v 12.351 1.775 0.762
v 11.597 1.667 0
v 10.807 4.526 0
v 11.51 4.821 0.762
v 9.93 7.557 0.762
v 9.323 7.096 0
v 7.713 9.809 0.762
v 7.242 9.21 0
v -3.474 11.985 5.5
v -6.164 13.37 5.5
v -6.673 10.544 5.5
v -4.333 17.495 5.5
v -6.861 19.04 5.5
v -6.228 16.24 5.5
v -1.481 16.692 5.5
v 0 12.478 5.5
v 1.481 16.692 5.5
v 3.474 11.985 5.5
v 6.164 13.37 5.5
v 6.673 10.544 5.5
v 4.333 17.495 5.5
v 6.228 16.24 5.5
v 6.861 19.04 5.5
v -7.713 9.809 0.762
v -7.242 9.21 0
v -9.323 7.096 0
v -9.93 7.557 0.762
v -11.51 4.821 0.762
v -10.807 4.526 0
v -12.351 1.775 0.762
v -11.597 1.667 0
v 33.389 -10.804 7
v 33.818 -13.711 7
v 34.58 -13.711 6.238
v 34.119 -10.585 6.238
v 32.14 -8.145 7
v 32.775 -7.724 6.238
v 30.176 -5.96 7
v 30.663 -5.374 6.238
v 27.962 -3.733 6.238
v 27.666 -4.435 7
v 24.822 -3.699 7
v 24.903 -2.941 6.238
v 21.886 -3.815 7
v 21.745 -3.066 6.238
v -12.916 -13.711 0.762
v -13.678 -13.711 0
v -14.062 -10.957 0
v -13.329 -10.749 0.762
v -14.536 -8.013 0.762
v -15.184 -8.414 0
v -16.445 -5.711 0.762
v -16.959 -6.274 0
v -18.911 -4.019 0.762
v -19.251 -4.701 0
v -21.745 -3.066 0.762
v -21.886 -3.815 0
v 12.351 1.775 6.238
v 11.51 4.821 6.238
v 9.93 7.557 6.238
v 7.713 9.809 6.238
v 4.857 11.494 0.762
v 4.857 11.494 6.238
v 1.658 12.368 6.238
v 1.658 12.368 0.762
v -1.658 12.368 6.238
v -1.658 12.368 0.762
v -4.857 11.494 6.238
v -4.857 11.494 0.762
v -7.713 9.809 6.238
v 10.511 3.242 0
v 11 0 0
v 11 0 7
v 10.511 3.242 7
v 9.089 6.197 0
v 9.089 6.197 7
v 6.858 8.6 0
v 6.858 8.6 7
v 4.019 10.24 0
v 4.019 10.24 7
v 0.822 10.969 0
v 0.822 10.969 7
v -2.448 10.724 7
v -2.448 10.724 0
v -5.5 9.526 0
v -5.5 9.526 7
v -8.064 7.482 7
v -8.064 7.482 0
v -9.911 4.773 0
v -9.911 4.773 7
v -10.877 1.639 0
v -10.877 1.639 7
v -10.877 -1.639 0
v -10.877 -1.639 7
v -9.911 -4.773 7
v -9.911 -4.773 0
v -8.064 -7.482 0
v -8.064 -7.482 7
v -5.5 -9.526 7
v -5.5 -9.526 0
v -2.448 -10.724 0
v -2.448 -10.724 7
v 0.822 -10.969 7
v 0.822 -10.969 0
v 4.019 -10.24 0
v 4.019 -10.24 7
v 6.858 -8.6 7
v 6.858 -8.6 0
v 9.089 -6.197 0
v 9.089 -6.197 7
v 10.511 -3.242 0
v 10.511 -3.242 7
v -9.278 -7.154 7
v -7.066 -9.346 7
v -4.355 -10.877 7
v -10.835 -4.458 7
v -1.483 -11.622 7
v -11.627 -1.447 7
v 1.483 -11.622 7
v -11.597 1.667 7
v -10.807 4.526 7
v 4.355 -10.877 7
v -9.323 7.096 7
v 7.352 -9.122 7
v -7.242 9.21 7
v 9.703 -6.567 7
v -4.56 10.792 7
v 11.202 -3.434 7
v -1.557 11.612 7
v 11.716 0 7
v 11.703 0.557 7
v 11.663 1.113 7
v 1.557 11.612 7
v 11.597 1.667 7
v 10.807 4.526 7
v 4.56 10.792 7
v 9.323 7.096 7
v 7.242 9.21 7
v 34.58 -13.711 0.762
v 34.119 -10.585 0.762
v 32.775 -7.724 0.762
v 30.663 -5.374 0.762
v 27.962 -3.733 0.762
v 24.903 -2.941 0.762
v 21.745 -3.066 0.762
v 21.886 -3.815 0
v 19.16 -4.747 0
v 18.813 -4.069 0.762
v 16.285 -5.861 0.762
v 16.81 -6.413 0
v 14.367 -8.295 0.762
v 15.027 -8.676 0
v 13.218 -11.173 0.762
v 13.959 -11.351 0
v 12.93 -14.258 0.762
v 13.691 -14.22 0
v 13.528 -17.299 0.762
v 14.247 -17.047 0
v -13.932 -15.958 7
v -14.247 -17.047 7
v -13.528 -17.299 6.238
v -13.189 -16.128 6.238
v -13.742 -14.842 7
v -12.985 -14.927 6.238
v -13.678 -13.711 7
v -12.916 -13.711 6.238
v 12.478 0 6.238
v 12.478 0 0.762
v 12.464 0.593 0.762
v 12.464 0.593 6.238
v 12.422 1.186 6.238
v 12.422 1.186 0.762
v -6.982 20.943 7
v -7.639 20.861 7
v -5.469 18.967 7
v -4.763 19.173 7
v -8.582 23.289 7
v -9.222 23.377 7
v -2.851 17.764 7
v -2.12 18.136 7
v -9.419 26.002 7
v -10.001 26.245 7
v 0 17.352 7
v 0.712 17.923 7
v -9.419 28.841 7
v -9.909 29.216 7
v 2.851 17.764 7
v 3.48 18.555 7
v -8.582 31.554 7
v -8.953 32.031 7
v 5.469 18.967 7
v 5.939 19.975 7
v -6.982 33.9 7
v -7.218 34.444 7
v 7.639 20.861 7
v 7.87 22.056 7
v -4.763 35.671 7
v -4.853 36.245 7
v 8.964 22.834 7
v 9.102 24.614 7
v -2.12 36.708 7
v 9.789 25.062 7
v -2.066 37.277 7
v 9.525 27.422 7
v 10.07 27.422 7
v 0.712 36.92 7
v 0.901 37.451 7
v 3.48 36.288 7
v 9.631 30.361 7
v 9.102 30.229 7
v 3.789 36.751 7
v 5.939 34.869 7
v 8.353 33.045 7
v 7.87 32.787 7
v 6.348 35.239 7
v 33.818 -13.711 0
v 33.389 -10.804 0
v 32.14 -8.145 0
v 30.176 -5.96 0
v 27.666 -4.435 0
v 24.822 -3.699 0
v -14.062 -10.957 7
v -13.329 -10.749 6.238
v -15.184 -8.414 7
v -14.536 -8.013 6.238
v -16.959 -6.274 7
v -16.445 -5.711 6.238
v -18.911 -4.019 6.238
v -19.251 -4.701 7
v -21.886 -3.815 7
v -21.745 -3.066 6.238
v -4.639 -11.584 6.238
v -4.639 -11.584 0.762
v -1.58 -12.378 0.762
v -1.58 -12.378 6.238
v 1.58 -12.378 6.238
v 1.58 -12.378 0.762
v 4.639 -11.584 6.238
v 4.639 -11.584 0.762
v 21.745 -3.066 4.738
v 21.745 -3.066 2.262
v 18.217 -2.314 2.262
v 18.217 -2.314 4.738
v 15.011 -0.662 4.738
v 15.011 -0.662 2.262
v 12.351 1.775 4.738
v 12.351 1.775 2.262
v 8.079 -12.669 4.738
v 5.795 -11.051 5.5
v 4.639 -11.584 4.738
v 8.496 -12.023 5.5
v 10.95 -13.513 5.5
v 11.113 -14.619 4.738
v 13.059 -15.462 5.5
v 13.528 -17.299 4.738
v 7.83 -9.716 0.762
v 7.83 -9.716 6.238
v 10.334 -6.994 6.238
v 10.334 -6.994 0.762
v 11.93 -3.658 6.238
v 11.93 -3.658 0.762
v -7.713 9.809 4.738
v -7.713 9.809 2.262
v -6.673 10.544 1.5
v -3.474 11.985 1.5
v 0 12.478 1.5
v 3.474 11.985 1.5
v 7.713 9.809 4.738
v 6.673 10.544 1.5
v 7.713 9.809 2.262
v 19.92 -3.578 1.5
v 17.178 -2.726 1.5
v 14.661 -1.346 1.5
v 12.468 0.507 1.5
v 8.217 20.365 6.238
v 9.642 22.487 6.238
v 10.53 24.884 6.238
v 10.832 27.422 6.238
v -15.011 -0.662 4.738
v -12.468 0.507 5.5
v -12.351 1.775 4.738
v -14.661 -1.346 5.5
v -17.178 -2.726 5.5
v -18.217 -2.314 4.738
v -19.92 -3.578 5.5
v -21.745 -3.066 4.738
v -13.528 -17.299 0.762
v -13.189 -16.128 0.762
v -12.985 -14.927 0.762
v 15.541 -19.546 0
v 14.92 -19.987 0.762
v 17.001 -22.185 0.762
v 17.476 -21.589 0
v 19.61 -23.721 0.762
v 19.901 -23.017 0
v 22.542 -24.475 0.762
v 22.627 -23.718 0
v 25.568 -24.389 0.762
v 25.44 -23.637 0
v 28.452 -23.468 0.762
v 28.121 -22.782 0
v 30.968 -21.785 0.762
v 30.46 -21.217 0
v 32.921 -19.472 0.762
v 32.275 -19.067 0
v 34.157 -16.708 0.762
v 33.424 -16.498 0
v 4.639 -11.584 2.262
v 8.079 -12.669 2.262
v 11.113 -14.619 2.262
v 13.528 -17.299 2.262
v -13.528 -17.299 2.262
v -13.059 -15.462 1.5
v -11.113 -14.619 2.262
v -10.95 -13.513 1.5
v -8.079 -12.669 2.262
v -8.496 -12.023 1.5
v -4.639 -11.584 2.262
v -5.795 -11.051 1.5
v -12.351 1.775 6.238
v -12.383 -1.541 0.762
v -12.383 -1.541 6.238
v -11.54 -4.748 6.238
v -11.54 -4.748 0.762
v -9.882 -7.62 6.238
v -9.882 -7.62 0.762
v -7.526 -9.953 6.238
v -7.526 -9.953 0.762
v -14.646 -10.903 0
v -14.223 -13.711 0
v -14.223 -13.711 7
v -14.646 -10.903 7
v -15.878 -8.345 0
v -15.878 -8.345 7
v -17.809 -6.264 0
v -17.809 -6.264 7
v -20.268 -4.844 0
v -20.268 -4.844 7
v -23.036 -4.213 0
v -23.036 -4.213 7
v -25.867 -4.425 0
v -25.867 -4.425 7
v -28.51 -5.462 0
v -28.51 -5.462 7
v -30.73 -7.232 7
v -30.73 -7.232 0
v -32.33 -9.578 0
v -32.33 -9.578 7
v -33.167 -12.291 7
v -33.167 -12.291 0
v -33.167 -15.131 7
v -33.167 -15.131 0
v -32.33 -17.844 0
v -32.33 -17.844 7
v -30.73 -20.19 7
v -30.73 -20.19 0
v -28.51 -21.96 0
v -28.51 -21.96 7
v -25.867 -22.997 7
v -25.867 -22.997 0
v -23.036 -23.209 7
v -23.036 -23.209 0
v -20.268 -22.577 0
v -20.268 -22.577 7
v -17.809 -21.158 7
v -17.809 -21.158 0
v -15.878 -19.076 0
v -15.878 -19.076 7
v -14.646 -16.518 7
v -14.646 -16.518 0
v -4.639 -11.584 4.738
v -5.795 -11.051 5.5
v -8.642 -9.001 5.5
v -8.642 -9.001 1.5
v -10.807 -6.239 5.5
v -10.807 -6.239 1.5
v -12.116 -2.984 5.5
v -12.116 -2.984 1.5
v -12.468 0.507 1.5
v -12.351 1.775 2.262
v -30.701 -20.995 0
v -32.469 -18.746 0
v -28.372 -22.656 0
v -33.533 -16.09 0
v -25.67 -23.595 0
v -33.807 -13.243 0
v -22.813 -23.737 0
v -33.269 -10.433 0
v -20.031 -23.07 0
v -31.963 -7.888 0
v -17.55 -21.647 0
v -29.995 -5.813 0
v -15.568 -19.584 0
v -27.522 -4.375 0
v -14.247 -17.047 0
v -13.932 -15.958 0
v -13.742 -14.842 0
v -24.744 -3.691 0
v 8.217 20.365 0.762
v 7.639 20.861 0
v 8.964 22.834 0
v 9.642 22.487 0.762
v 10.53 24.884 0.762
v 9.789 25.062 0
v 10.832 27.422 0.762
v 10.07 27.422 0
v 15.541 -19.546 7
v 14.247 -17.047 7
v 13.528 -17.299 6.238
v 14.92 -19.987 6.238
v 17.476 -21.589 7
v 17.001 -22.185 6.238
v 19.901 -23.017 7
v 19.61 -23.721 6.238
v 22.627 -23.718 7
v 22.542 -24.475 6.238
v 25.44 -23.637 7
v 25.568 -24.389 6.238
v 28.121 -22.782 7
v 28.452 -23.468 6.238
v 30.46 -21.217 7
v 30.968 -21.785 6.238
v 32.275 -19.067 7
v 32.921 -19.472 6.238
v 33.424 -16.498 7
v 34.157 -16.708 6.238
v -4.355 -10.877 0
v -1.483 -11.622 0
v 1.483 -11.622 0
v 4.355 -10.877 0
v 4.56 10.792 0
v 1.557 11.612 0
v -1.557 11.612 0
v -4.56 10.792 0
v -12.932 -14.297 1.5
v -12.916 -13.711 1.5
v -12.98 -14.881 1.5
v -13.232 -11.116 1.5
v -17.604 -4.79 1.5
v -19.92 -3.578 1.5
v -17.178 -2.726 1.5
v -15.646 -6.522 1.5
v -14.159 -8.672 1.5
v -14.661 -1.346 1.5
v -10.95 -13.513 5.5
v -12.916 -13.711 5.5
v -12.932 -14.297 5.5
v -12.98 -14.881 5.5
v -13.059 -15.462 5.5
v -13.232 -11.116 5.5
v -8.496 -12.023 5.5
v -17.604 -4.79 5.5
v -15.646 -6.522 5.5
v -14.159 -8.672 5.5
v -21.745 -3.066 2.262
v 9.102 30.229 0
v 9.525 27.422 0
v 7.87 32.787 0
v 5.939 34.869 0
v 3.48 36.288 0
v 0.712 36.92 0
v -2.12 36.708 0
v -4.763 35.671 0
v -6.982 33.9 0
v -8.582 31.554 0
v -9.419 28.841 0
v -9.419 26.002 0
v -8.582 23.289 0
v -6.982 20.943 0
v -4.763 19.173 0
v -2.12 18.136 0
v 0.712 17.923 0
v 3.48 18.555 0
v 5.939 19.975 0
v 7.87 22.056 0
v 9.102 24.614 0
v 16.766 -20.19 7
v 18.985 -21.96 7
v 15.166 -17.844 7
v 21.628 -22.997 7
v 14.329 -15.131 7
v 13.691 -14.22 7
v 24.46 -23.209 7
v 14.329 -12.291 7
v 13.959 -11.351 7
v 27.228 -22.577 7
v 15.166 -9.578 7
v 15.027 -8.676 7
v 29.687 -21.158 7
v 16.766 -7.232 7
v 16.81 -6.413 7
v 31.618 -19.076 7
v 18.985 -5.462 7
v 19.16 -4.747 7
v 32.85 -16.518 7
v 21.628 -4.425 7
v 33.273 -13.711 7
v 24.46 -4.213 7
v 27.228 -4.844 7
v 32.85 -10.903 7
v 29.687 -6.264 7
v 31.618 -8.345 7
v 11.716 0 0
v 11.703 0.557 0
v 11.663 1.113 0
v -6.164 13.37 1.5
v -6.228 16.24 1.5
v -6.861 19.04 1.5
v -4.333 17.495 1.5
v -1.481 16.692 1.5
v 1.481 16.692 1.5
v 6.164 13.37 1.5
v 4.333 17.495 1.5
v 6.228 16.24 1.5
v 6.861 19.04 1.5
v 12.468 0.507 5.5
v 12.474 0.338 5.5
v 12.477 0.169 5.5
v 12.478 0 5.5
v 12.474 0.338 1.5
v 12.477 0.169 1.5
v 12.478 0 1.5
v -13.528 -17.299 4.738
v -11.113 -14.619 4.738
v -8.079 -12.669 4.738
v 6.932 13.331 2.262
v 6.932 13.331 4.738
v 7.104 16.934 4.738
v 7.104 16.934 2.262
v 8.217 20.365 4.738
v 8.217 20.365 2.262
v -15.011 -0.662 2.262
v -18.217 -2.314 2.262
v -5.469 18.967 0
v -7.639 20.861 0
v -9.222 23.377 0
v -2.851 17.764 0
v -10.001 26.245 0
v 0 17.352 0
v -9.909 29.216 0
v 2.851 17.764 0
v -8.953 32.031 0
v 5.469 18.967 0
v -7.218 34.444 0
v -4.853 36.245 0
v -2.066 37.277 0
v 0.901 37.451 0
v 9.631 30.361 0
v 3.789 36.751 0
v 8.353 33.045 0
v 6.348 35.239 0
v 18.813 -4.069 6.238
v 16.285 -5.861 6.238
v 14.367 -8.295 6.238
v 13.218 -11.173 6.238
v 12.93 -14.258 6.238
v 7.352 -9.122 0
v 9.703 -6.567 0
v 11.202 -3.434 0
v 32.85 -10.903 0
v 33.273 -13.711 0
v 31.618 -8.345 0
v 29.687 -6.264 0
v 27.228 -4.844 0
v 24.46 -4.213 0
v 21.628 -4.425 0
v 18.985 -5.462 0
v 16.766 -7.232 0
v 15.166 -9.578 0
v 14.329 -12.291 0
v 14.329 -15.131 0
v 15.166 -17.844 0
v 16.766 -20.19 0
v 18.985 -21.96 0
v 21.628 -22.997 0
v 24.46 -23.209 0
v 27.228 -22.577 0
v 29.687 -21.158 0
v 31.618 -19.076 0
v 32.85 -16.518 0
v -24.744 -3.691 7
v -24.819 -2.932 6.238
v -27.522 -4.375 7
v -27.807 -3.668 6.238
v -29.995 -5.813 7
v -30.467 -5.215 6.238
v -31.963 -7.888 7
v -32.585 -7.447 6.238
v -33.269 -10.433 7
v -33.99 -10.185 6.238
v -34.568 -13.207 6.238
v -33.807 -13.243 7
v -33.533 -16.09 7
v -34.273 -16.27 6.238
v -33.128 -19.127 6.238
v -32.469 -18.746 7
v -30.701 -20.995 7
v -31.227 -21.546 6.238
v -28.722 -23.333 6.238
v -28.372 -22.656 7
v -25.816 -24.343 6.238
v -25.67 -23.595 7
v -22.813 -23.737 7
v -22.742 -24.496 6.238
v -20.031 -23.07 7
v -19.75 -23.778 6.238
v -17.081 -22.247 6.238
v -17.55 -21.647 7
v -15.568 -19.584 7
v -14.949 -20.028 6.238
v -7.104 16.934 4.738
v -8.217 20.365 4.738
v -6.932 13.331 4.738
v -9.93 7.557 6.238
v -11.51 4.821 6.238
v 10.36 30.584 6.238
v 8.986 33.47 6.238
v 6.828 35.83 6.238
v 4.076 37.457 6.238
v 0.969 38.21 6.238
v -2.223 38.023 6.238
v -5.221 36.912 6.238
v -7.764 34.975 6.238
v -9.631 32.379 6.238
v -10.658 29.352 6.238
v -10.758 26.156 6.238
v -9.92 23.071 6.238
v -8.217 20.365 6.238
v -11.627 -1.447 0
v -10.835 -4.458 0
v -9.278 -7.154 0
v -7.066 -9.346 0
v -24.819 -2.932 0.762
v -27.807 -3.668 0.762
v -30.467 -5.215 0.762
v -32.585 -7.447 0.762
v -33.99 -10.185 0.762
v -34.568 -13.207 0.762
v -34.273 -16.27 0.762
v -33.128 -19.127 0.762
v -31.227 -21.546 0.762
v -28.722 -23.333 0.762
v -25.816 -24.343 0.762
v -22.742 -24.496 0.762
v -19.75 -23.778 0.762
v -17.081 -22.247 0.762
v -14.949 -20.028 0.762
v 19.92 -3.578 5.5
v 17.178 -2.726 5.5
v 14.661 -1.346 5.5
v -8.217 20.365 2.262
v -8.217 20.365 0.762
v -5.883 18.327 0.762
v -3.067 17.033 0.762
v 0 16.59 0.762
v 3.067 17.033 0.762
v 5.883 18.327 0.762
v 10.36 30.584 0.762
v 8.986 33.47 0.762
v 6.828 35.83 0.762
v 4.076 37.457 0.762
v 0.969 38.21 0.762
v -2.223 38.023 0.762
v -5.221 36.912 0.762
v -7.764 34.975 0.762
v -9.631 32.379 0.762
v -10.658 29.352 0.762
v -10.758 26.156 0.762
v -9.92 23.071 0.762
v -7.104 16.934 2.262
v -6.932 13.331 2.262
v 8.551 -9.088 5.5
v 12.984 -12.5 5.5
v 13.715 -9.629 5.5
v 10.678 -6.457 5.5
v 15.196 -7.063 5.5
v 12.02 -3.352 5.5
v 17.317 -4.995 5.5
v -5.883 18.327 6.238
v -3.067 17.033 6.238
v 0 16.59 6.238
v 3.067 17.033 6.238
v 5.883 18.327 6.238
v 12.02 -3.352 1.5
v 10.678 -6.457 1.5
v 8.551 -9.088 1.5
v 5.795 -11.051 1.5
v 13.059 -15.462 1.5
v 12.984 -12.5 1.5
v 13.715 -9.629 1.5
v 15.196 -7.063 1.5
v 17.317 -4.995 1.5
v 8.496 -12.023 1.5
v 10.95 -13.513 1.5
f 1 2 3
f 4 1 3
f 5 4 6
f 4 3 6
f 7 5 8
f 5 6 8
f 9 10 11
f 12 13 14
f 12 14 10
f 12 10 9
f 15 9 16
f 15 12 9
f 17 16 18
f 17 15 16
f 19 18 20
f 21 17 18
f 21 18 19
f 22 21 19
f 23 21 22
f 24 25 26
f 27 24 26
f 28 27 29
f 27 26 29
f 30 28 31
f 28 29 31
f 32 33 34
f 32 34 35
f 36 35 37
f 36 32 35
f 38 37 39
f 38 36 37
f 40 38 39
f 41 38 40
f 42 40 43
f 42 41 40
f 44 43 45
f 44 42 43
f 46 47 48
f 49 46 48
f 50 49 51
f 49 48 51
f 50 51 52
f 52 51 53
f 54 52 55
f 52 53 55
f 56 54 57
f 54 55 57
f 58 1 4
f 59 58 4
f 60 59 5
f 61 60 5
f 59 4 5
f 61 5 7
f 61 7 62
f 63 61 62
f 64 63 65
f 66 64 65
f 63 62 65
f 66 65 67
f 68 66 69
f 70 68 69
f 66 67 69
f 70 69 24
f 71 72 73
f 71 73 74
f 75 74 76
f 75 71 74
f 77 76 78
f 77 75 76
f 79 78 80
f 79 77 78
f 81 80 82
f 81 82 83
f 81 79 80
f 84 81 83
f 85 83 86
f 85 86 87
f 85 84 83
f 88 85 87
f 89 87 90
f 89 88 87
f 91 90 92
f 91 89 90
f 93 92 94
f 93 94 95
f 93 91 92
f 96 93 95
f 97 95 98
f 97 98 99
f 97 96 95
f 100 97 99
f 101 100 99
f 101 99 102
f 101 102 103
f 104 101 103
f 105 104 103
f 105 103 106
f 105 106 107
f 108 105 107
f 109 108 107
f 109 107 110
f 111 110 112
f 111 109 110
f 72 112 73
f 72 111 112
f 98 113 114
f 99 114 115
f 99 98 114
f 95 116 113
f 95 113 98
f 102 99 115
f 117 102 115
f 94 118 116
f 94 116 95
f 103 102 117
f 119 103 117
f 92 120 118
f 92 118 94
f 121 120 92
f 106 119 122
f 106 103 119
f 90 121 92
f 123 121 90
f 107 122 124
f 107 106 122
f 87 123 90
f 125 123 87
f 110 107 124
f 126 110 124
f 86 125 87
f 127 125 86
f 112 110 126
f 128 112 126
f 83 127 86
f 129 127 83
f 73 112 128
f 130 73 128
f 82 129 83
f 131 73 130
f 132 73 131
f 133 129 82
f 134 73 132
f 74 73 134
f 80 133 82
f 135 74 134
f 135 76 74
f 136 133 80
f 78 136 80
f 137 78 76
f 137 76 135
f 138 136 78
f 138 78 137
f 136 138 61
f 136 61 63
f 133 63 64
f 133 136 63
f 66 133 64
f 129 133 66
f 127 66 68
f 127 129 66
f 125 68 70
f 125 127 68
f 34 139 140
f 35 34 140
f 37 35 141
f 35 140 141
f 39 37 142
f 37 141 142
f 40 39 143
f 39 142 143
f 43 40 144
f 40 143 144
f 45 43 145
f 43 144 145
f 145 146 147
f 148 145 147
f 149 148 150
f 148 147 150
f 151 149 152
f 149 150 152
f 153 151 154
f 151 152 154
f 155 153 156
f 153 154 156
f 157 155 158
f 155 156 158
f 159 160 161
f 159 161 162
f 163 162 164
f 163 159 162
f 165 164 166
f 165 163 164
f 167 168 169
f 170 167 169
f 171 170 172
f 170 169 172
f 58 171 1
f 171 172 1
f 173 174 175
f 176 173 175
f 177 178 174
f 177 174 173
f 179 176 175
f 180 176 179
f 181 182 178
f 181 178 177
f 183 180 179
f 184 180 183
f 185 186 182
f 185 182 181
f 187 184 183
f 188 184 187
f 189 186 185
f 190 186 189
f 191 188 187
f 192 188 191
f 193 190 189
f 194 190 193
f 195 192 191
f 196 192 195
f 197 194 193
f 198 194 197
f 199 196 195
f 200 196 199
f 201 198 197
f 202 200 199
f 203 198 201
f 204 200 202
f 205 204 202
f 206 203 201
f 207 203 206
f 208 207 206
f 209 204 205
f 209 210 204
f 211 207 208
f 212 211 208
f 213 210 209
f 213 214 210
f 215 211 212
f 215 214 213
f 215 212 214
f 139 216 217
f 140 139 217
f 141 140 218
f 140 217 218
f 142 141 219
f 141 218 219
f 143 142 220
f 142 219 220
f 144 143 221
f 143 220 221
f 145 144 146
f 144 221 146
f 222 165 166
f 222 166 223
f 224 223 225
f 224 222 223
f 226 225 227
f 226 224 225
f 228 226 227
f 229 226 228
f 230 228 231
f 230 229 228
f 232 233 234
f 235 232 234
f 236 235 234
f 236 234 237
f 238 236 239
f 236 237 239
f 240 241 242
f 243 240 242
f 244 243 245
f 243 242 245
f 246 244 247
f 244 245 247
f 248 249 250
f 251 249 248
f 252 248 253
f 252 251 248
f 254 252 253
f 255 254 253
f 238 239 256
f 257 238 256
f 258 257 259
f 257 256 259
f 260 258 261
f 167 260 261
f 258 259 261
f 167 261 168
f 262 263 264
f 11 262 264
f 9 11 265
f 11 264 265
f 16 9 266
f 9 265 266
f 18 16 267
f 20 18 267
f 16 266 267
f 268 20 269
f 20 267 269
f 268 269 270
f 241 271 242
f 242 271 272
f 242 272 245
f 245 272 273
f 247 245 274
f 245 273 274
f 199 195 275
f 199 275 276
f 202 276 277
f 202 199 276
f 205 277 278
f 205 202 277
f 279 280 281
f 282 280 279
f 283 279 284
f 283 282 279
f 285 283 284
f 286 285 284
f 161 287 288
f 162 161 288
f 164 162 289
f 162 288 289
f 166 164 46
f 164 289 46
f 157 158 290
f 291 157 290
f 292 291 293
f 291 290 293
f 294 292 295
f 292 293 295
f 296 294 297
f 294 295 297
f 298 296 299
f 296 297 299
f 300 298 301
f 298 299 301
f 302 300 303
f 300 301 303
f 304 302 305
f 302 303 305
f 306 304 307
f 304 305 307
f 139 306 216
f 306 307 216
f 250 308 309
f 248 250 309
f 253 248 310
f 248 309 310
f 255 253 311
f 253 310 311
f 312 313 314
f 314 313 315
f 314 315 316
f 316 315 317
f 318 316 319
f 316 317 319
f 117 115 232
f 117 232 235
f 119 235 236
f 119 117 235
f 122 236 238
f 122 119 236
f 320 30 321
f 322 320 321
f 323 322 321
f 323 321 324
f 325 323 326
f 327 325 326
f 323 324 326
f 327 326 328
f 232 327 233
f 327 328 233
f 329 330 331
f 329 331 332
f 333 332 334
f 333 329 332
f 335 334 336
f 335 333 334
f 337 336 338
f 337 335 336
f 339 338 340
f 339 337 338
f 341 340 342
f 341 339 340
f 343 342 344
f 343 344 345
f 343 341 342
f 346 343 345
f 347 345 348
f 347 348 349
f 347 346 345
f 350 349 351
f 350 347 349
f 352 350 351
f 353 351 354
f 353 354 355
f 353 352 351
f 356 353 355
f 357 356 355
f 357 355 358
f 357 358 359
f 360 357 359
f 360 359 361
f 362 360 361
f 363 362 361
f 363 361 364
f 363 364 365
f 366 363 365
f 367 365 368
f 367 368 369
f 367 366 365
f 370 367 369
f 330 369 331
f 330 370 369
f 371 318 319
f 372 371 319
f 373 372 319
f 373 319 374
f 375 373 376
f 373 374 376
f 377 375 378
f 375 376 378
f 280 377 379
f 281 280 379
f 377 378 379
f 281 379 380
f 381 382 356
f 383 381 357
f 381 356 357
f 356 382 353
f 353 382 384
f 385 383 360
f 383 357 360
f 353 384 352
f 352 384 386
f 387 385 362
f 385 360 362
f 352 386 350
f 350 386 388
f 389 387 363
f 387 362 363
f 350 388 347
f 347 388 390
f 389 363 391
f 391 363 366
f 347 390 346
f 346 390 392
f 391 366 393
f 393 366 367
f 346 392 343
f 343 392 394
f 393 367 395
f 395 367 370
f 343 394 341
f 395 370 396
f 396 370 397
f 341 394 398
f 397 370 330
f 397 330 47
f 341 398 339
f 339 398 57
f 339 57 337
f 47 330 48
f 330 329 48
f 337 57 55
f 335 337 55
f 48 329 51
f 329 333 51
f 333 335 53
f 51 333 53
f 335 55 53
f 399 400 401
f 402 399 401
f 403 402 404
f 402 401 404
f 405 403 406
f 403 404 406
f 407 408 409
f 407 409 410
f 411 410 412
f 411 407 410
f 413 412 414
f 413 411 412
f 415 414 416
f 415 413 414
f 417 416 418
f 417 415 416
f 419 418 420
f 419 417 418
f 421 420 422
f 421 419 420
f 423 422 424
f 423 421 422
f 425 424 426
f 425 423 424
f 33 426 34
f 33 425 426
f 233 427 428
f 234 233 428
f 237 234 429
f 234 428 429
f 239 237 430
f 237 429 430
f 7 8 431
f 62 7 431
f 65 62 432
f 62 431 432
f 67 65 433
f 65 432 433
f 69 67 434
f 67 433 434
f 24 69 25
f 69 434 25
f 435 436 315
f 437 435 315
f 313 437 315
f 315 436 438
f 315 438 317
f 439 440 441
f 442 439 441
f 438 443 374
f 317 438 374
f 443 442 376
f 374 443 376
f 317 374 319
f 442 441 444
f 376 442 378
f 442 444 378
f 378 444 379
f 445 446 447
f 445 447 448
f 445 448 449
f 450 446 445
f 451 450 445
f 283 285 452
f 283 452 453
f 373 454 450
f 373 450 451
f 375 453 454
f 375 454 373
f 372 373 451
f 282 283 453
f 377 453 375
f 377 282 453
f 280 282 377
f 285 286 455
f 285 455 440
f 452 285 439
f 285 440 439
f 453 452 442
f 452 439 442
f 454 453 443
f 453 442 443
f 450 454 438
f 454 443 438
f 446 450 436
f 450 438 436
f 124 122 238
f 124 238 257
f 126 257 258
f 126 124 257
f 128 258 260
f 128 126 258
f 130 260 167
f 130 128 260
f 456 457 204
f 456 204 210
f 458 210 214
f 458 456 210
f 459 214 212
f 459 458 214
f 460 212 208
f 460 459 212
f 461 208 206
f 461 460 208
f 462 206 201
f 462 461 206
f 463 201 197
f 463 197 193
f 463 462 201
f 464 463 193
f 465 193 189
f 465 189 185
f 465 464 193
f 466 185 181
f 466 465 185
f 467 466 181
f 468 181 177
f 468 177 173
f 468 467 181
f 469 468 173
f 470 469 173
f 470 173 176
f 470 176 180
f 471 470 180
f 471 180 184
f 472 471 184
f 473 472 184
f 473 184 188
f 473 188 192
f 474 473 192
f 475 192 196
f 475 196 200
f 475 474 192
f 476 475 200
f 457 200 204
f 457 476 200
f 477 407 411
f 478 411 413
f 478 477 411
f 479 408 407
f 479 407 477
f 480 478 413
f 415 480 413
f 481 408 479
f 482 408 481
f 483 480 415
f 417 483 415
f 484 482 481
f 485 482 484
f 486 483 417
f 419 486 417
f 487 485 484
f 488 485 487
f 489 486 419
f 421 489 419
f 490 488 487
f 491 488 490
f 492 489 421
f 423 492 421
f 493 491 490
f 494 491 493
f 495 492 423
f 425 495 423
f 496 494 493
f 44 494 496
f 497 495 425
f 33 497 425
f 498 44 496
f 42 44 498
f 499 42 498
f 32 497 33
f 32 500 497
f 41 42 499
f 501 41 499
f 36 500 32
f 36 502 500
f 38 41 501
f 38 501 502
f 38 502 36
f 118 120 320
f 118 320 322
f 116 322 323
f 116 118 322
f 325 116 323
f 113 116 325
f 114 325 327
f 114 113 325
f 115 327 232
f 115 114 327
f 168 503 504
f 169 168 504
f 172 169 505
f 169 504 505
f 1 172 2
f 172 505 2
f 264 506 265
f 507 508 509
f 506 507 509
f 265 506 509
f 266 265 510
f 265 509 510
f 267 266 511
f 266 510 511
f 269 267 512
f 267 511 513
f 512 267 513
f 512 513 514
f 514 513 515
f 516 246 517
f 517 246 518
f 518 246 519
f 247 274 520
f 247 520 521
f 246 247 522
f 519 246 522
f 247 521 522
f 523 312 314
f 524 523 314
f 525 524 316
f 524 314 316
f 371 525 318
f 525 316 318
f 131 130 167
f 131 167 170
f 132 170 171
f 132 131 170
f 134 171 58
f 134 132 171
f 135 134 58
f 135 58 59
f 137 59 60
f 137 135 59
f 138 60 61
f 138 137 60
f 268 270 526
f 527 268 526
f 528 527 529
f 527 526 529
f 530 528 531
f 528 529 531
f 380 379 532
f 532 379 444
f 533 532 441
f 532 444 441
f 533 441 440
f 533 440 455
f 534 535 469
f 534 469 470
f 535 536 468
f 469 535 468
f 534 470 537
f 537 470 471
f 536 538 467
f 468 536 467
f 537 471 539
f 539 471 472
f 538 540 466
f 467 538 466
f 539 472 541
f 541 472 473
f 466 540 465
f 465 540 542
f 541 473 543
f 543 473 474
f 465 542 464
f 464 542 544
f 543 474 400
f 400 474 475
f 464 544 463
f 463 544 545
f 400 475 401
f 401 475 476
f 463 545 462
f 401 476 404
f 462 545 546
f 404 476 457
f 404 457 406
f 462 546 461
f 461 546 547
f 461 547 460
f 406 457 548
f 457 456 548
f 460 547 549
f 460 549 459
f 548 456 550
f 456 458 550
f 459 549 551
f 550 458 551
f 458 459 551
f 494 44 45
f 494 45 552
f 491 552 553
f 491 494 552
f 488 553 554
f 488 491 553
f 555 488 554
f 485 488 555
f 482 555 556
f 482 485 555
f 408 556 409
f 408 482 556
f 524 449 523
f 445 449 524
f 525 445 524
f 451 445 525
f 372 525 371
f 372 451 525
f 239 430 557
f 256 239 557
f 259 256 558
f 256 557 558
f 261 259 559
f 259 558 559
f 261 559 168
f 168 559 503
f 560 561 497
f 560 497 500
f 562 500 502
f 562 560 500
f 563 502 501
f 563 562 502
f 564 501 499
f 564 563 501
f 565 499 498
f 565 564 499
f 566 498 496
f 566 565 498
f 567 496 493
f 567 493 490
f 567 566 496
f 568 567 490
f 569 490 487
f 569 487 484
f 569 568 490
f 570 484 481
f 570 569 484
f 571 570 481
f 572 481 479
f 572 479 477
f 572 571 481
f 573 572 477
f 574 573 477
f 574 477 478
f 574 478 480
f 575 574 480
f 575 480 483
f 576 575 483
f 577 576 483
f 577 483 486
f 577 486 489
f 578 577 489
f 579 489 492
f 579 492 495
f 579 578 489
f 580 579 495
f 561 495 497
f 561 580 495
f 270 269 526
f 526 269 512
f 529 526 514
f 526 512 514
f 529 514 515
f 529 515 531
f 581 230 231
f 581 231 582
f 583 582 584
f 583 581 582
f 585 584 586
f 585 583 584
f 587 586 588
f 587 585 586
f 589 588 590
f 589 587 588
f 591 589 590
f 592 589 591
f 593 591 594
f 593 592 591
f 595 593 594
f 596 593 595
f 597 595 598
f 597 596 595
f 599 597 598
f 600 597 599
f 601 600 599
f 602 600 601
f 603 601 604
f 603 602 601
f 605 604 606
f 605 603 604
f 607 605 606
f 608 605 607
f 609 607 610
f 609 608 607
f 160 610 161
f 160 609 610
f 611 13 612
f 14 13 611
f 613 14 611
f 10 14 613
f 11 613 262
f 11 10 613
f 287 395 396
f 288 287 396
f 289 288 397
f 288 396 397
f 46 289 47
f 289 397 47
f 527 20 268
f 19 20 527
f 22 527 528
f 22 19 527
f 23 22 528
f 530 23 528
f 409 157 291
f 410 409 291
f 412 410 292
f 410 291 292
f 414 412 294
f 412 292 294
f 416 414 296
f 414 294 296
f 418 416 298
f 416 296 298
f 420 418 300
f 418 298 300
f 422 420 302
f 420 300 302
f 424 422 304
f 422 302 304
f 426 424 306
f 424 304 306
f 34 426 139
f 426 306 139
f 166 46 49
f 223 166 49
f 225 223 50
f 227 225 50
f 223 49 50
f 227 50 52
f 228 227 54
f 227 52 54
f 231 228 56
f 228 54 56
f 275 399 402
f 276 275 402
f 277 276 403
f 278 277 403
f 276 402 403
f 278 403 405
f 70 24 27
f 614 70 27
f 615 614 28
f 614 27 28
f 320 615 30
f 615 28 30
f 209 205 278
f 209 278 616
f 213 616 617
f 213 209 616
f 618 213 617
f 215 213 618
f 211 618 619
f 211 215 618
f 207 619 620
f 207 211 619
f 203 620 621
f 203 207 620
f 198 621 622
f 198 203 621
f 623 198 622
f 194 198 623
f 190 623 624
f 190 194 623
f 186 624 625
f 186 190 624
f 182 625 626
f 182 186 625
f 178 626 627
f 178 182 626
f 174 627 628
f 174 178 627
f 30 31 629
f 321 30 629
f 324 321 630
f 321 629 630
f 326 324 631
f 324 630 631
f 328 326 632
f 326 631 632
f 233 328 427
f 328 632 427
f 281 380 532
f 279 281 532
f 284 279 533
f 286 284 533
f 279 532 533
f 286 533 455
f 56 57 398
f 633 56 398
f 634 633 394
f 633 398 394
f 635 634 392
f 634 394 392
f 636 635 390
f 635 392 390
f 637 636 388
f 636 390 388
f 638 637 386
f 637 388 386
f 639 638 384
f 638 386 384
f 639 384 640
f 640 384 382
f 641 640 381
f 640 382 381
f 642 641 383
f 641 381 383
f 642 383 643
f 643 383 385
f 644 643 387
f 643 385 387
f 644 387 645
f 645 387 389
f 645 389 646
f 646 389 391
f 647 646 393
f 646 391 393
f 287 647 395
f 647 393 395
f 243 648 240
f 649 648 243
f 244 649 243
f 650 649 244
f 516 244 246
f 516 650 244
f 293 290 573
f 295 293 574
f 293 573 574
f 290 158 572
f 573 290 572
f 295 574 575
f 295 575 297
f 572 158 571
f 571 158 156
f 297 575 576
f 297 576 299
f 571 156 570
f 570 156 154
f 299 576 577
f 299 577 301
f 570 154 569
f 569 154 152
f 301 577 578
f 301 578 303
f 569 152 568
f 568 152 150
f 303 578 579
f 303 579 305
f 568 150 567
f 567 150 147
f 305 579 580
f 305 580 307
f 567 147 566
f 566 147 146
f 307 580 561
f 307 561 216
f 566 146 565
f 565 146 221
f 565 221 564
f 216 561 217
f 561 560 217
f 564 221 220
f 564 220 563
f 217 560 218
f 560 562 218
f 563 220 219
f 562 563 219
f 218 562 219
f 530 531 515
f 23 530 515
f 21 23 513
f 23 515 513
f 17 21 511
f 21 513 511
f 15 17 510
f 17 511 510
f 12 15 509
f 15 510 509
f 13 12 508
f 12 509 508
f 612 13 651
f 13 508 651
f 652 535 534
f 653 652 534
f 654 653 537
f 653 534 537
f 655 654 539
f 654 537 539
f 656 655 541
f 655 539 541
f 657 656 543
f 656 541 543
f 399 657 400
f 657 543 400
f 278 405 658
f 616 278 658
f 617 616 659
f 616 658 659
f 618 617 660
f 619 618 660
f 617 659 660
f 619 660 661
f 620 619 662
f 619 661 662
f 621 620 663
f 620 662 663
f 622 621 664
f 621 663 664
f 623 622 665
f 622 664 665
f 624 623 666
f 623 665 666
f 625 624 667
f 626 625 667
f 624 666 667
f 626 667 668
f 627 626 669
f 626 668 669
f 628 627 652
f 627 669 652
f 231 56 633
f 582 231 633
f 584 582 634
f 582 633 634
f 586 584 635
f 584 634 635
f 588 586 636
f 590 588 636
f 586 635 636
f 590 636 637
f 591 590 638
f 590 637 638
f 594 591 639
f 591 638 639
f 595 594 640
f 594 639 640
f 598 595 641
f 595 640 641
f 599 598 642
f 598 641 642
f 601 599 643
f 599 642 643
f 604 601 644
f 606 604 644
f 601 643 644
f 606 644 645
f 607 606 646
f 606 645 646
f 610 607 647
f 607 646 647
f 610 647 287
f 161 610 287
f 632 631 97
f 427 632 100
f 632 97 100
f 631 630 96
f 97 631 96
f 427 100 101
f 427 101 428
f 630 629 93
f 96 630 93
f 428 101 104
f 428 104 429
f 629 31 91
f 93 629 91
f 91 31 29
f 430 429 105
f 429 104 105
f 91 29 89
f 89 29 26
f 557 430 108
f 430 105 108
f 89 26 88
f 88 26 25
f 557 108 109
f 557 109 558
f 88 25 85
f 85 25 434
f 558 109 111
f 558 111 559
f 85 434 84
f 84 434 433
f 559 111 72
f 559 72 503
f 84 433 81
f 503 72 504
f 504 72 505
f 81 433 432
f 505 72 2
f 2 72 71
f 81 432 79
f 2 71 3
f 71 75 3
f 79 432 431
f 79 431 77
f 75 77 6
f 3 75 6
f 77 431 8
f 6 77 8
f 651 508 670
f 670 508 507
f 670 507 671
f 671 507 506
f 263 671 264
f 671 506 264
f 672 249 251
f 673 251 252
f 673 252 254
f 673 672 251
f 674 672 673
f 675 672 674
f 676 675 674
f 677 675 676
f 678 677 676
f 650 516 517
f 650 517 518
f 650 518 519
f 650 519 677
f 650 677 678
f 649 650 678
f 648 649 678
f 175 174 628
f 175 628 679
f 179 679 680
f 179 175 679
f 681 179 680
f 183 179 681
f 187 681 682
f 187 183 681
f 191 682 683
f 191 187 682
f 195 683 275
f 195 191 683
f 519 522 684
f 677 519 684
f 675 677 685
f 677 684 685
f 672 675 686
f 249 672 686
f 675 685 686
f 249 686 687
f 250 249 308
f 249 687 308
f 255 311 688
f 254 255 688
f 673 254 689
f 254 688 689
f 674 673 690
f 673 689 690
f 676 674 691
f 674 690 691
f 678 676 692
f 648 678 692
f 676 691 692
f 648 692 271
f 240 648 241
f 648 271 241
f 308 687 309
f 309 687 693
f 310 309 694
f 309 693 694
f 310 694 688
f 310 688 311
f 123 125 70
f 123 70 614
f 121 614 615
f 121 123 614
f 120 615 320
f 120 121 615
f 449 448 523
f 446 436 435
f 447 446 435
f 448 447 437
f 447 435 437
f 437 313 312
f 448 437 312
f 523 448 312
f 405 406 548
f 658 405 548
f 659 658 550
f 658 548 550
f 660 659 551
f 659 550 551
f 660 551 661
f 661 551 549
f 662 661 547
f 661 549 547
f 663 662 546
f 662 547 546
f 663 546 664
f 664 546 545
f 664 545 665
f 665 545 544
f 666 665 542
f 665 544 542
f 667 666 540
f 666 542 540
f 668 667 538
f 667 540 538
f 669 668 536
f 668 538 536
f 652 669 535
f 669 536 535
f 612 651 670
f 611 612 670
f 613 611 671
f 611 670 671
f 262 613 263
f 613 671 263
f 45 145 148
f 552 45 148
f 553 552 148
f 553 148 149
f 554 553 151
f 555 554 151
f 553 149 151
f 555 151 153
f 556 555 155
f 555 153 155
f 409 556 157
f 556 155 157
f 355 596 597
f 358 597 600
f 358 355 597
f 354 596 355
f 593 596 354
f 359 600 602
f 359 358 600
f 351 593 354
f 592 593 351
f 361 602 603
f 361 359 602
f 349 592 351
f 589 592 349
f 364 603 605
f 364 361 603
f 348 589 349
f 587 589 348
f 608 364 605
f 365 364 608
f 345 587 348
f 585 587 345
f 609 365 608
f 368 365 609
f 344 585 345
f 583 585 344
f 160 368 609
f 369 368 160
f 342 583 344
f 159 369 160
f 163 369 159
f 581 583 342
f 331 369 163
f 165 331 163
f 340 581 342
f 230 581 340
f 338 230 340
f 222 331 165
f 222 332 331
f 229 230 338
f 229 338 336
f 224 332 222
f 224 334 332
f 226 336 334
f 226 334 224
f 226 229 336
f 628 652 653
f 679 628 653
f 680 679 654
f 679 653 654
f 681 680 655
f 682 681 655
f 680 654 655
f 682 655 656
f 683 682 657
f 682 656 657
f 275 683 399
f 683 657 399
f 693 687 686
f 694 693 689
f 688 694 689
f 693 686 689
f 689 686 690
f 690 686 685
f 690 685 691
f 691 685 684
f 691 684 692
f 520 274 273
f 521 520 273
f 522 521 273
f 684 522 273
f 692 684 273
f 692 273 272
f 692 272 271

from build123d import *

# Parameters (mm, degrees)
F0_R      = 11
F1_DEPTH  = 7
F0_R_2    = 9.525
F2_DEPTH  = 4
F4_SIZE   = 0.762
F4_2_SIZE = 0.762
F4_3_SIZE = 0.762
F4_4_SIZE = 0.762
F4_5_SIZE = 0.762
F4_6_SIZE = 0.762
F5_SIZE   = 0.762


with BuildPart() as f1:
    # F0 (on Top) → F1 (new body)
    with BuildSketch(Plane.XY):
        with BuildLine():
            ThreePointArc((7.7129085609, 9.8091523887), (0, 12.4783183584), (-7.7129085609, 9.8091523887))
            ThreePointArc((-7.7129085609, 9.8091523887), (-10.8065406949, 6.2391591792), (-12.3514294386, 1.7749985565))
            ThreePointArc((-12.3514294386, 1.7749985565), (-10.8065406949, -6.2391591792), (-4.6385208777, -11.5841509452))
            ThreePointArc((-4.6385208777, -11.5841509452), (0, -12.4783183584), (4.6385208777, -11.5841509452))
            ThreePointArc((4.6385208777, -11.5841509452), (10.3341513749, -6.993836173), (12.4783183584, 0))
            ThreePointArc((12.4783183584, 0), (12.4465557037, 0.8897641083), (12.3514294386, 1.7749985565))
            ThreePointArc((12.3514294386, 1.7749985565), (10.8065406949, 6.2391591792), (7.7129085609, 9.8091523887))
        make_face()
        Circle(F0_R, mode=Mode.SUBTRACT)
    extrude(amount=F1_DEPTH)

    # F5
    f5_edges = [f1.edges().sort_by_distance(p)[0] for p in [
        (4.638521, 11.584151, 0),
        (4.638521, 11.584151, 7),
    ]]
    chamfer(f5_edges, length=F5_SIZE)


with BuildPart() as f1b:
    # F0 (on Top) → F1, piece 2 (new body)
    with BuildSketch(Plane.XY):
        with BuildLine():
            ThreePointArc((34.5796740347, -13.7108754092), (30.6628901227, -5.3736106775), (21.7451755252, -3.0658962719))
            ThreePointArc((21.7451755252, -3.0658962719), (14.36736977, -8.2950048043), (13.5277318194, -17.2989262787))
            ThreePointArc((13.5277318194, -17.2989262787), (25.567829145, -24.3886371137), (34.5796740347, -13.7108754092))
        make_face()
        with Locations((23.7479328249, -13.7108754092)):
            Circle(F0_R_2, mode=Mode.SUBTRACT)
    extrude(amount=F1_DEPTH)

    # F4
    f4_edges = [f1b.edges().sort_by_distance(p)[0] for p in [
        (33.968134, -10.122825, 7),
        (33.968134, -10.122825, 0),
    ]]
    chamfer(f4_edges, length=F4_SIZE)


with BuildPart() as f1c:
    # F0 (on Top) → F1, piece 3 (new body)
    with BuildSketch(Plane.XY):
        with BuildLine():
            ThreePointArc((-12.9161916152, -13.7108754092), (-15.4106680933, -6.7959181114), (-21.7451755252, -3.0658962719))
            ThreePointArc((-21.7451755252, -3.0658962719), (-33.1284958798, -19.126746014), (-13.5277318194, -17.2989262787))
            ThreePointArc((-13.5277318194, -17.2989262787), (-13.0701711204, -15.5307717293), (-12.9161916152, -13.7108754092))
        make_face()
        with Locations((-23.7479328249, -13.7108754092)):
            Circle(F0_R_2, mode=Mode.SUBTRACT)
    extrude(amount=F1_DEPTH)

    # F4#2
    f4_2_edges = [f1c.edges().sort_by_distance(p)[0] for p in [
        (-33.968134, -10.122825, 0),
        (-33.968134, -10.122825, 7),
    ]]
    chamfer(f4_2_edges, length=F4_2_SIZE)


with BuildPart() as f1d:
    # F0 (on Top) → F1, piece 4 (new body)
    with BuildSketch(Plane.XY):
        with BuildLine():
            ThreePointArc((8.2174437058, 20.3648225505), (10.1571610518, 23.6589464115), (10.8317412098, 27.4217508183))
            ThreePointArc((10.8317412098, 27.4217508183), (-3.7628044068, 37.5789118701), (-8.2174437058, 20.3648225505))
            ThreePointArc((-8.2174437058, 20.3648225505), (0, 16.5900096086), (8.2174437058, 20.3648225505))
        make_face()
        with Locations((0, 27.4217508183)):
            Circle(F0_R_2, mode=Mode.SUBTRACT)
    extrude(amount=F1_DEPTH)

    # F4#3
    f4_3_edges = [f1d.edges().sort_by_distance(p)[0] for p in [
        (8.217444, 34.478679, 7),
        (8.217444, 34.478679, 0),
    ]]
    chamfer(f4_3_edges, length=F4_3_SIZE)


with BuildPart() as f2:
    # F0 (on Top) → F2 (new body)
    with BuildSketch(Plane.XY):
        with BuildLine():
            ThreePointArc((21.7451755252, -3.0658962719), (16.5590514817, -1.5948393798), (12.3514294386, 1.7749985565))
            ThreePointArc((12.3514294386, 1.7749985565), (12.4465557037, 0.8897641083), (12.4783183584, 0))
            ThreePointArc((12.4783183584, 0), (10.3341513749, -6.993836173), (4.6385208777, -11.5841509452))
            ThreePointArc((4.6385208777, -11.5841509452), (9.6606971587, -13.5431395558), (13.5277318194, -17.2989262787))
            ThreePointArc((13.5277318194, -17.2989262787), (14.36736977, -8.2950048043), (21.7451755252, -3.0658962719))
        make_face()
    extrude(amount=F2_DEPTH)


with BuildPart() as f2b:
    # F0 (on Top) → F2, piece 2 (new body)
    with BuildSketch(Plane.XY):
        with BuildLine():
            ThreePointArc((-4.6385208777, -11.5841509452), (-10.8065406949, -6.2391591792), (-12.3514294386, 1.7749985565))
            ThreePointArc((-12.3514294386, 1.7749985565), (-16.5590514817, -1.5948393798), (-21.7451755252, -3.0658962719))
            ThreePointArc((-21.7451755252, -3.0658962719), (-15.4106680933, -6.7959181114), (-12.9161916152, -13.7108754092))
            ThreePointArc((-12.9161916152, -13.7108754092), (-13.0701711204, -15.5307717293), (-13.5277318194, -17.2989262787))
            ThreePointArc((-13.5277318194, -17.2989262787), (-9.6606971587, -13.5431395558), (-4.6385208777, -11.5841509452))
        make_face()
    extrude(amount=F2_DEPTH)


with BuildPart() as f2c:
    # F0 (on Top) → F2, piece 3 (new body)
    with BuildSketch(Plane.XY):
        with BuildLine():
            ThreePointArc((8.2174437058, 20.3648225505), (0, 16.5900096086), (-8.2174437058, 20.3648225505))
            ThreePointArc((-8.2174437058, 20.3648225505), (-6.898354323, 15.1379789356), (-7.7129085609, 9.8091523887))
            ThreePointArc((-7.7129085609, 9.8091523887), (0, 12.4783183584), (7.7129085609, 9.8091523887))
            ThreePointArc((7.7129085609, 9.8091523887), (6.898354323, 15.1379789356), (8.2174437058, 20.3648225505))
        make_face()
    extrude(amount=F2_DEPTH)


with BuildPart() as f2c_1:
    # F3: moved
    add(f2c.part.moved(Location((0, 0, 1.5))))

    # F4#5
    f4_5_edges = [f2c_1.edges().sort_by_distance(p)[0] for p in [
        (6.898354, 15.137979, 5.5),
        (6.898354, 15.137979, 1.5),
        (-6.898354, 15.137979, 1.5),
        (-6.898354, 15.137979, 5.5),
    ]]
    chamfer(f4_5_edges, length=F4_5_SIZE)


with BuildPart() as f2b_1:
    # F3: moved
    add(f2b.part.moved(Location((0, 0, 1.5))))

    # F4#6
    f4_6_edges = [f2b_1.edges().sort_by_distance(p)[0] for p in [
        (-9.660697, -13.54314, 1.5),
        (-9.660697, -13.54314, 5.5),
        (-16.559051, -1.594839, 5.5),
        (-16.559051, -1.594839, 1.5),
    ]]
    chamfer(f4_6_edges, length=F4_6_SIZE)


with BuildPart() as f2_1:
    # F3: moved
    add(f2.part.moved(Location((0, 0, 1.5))))

    # F4#4
    f4_4_edges = [f2_1.edges().sort_by_distance(p)[0] for p in [
        (9.660697, -13.54314, 5.5),
        (9.660697, -13.54314, 1.5),
        (16.559051, -1.594839, 1.5),
        (16.559051, -1.594839, 5.5),
    ]]
    chamfer(f4_4_edges, length=F4_4_SIZE)


solid = Compound([f1.part, f1b.part, f1c.part, f1d.part, f2c_1.part, f2b_1.part, f2_1.part])
